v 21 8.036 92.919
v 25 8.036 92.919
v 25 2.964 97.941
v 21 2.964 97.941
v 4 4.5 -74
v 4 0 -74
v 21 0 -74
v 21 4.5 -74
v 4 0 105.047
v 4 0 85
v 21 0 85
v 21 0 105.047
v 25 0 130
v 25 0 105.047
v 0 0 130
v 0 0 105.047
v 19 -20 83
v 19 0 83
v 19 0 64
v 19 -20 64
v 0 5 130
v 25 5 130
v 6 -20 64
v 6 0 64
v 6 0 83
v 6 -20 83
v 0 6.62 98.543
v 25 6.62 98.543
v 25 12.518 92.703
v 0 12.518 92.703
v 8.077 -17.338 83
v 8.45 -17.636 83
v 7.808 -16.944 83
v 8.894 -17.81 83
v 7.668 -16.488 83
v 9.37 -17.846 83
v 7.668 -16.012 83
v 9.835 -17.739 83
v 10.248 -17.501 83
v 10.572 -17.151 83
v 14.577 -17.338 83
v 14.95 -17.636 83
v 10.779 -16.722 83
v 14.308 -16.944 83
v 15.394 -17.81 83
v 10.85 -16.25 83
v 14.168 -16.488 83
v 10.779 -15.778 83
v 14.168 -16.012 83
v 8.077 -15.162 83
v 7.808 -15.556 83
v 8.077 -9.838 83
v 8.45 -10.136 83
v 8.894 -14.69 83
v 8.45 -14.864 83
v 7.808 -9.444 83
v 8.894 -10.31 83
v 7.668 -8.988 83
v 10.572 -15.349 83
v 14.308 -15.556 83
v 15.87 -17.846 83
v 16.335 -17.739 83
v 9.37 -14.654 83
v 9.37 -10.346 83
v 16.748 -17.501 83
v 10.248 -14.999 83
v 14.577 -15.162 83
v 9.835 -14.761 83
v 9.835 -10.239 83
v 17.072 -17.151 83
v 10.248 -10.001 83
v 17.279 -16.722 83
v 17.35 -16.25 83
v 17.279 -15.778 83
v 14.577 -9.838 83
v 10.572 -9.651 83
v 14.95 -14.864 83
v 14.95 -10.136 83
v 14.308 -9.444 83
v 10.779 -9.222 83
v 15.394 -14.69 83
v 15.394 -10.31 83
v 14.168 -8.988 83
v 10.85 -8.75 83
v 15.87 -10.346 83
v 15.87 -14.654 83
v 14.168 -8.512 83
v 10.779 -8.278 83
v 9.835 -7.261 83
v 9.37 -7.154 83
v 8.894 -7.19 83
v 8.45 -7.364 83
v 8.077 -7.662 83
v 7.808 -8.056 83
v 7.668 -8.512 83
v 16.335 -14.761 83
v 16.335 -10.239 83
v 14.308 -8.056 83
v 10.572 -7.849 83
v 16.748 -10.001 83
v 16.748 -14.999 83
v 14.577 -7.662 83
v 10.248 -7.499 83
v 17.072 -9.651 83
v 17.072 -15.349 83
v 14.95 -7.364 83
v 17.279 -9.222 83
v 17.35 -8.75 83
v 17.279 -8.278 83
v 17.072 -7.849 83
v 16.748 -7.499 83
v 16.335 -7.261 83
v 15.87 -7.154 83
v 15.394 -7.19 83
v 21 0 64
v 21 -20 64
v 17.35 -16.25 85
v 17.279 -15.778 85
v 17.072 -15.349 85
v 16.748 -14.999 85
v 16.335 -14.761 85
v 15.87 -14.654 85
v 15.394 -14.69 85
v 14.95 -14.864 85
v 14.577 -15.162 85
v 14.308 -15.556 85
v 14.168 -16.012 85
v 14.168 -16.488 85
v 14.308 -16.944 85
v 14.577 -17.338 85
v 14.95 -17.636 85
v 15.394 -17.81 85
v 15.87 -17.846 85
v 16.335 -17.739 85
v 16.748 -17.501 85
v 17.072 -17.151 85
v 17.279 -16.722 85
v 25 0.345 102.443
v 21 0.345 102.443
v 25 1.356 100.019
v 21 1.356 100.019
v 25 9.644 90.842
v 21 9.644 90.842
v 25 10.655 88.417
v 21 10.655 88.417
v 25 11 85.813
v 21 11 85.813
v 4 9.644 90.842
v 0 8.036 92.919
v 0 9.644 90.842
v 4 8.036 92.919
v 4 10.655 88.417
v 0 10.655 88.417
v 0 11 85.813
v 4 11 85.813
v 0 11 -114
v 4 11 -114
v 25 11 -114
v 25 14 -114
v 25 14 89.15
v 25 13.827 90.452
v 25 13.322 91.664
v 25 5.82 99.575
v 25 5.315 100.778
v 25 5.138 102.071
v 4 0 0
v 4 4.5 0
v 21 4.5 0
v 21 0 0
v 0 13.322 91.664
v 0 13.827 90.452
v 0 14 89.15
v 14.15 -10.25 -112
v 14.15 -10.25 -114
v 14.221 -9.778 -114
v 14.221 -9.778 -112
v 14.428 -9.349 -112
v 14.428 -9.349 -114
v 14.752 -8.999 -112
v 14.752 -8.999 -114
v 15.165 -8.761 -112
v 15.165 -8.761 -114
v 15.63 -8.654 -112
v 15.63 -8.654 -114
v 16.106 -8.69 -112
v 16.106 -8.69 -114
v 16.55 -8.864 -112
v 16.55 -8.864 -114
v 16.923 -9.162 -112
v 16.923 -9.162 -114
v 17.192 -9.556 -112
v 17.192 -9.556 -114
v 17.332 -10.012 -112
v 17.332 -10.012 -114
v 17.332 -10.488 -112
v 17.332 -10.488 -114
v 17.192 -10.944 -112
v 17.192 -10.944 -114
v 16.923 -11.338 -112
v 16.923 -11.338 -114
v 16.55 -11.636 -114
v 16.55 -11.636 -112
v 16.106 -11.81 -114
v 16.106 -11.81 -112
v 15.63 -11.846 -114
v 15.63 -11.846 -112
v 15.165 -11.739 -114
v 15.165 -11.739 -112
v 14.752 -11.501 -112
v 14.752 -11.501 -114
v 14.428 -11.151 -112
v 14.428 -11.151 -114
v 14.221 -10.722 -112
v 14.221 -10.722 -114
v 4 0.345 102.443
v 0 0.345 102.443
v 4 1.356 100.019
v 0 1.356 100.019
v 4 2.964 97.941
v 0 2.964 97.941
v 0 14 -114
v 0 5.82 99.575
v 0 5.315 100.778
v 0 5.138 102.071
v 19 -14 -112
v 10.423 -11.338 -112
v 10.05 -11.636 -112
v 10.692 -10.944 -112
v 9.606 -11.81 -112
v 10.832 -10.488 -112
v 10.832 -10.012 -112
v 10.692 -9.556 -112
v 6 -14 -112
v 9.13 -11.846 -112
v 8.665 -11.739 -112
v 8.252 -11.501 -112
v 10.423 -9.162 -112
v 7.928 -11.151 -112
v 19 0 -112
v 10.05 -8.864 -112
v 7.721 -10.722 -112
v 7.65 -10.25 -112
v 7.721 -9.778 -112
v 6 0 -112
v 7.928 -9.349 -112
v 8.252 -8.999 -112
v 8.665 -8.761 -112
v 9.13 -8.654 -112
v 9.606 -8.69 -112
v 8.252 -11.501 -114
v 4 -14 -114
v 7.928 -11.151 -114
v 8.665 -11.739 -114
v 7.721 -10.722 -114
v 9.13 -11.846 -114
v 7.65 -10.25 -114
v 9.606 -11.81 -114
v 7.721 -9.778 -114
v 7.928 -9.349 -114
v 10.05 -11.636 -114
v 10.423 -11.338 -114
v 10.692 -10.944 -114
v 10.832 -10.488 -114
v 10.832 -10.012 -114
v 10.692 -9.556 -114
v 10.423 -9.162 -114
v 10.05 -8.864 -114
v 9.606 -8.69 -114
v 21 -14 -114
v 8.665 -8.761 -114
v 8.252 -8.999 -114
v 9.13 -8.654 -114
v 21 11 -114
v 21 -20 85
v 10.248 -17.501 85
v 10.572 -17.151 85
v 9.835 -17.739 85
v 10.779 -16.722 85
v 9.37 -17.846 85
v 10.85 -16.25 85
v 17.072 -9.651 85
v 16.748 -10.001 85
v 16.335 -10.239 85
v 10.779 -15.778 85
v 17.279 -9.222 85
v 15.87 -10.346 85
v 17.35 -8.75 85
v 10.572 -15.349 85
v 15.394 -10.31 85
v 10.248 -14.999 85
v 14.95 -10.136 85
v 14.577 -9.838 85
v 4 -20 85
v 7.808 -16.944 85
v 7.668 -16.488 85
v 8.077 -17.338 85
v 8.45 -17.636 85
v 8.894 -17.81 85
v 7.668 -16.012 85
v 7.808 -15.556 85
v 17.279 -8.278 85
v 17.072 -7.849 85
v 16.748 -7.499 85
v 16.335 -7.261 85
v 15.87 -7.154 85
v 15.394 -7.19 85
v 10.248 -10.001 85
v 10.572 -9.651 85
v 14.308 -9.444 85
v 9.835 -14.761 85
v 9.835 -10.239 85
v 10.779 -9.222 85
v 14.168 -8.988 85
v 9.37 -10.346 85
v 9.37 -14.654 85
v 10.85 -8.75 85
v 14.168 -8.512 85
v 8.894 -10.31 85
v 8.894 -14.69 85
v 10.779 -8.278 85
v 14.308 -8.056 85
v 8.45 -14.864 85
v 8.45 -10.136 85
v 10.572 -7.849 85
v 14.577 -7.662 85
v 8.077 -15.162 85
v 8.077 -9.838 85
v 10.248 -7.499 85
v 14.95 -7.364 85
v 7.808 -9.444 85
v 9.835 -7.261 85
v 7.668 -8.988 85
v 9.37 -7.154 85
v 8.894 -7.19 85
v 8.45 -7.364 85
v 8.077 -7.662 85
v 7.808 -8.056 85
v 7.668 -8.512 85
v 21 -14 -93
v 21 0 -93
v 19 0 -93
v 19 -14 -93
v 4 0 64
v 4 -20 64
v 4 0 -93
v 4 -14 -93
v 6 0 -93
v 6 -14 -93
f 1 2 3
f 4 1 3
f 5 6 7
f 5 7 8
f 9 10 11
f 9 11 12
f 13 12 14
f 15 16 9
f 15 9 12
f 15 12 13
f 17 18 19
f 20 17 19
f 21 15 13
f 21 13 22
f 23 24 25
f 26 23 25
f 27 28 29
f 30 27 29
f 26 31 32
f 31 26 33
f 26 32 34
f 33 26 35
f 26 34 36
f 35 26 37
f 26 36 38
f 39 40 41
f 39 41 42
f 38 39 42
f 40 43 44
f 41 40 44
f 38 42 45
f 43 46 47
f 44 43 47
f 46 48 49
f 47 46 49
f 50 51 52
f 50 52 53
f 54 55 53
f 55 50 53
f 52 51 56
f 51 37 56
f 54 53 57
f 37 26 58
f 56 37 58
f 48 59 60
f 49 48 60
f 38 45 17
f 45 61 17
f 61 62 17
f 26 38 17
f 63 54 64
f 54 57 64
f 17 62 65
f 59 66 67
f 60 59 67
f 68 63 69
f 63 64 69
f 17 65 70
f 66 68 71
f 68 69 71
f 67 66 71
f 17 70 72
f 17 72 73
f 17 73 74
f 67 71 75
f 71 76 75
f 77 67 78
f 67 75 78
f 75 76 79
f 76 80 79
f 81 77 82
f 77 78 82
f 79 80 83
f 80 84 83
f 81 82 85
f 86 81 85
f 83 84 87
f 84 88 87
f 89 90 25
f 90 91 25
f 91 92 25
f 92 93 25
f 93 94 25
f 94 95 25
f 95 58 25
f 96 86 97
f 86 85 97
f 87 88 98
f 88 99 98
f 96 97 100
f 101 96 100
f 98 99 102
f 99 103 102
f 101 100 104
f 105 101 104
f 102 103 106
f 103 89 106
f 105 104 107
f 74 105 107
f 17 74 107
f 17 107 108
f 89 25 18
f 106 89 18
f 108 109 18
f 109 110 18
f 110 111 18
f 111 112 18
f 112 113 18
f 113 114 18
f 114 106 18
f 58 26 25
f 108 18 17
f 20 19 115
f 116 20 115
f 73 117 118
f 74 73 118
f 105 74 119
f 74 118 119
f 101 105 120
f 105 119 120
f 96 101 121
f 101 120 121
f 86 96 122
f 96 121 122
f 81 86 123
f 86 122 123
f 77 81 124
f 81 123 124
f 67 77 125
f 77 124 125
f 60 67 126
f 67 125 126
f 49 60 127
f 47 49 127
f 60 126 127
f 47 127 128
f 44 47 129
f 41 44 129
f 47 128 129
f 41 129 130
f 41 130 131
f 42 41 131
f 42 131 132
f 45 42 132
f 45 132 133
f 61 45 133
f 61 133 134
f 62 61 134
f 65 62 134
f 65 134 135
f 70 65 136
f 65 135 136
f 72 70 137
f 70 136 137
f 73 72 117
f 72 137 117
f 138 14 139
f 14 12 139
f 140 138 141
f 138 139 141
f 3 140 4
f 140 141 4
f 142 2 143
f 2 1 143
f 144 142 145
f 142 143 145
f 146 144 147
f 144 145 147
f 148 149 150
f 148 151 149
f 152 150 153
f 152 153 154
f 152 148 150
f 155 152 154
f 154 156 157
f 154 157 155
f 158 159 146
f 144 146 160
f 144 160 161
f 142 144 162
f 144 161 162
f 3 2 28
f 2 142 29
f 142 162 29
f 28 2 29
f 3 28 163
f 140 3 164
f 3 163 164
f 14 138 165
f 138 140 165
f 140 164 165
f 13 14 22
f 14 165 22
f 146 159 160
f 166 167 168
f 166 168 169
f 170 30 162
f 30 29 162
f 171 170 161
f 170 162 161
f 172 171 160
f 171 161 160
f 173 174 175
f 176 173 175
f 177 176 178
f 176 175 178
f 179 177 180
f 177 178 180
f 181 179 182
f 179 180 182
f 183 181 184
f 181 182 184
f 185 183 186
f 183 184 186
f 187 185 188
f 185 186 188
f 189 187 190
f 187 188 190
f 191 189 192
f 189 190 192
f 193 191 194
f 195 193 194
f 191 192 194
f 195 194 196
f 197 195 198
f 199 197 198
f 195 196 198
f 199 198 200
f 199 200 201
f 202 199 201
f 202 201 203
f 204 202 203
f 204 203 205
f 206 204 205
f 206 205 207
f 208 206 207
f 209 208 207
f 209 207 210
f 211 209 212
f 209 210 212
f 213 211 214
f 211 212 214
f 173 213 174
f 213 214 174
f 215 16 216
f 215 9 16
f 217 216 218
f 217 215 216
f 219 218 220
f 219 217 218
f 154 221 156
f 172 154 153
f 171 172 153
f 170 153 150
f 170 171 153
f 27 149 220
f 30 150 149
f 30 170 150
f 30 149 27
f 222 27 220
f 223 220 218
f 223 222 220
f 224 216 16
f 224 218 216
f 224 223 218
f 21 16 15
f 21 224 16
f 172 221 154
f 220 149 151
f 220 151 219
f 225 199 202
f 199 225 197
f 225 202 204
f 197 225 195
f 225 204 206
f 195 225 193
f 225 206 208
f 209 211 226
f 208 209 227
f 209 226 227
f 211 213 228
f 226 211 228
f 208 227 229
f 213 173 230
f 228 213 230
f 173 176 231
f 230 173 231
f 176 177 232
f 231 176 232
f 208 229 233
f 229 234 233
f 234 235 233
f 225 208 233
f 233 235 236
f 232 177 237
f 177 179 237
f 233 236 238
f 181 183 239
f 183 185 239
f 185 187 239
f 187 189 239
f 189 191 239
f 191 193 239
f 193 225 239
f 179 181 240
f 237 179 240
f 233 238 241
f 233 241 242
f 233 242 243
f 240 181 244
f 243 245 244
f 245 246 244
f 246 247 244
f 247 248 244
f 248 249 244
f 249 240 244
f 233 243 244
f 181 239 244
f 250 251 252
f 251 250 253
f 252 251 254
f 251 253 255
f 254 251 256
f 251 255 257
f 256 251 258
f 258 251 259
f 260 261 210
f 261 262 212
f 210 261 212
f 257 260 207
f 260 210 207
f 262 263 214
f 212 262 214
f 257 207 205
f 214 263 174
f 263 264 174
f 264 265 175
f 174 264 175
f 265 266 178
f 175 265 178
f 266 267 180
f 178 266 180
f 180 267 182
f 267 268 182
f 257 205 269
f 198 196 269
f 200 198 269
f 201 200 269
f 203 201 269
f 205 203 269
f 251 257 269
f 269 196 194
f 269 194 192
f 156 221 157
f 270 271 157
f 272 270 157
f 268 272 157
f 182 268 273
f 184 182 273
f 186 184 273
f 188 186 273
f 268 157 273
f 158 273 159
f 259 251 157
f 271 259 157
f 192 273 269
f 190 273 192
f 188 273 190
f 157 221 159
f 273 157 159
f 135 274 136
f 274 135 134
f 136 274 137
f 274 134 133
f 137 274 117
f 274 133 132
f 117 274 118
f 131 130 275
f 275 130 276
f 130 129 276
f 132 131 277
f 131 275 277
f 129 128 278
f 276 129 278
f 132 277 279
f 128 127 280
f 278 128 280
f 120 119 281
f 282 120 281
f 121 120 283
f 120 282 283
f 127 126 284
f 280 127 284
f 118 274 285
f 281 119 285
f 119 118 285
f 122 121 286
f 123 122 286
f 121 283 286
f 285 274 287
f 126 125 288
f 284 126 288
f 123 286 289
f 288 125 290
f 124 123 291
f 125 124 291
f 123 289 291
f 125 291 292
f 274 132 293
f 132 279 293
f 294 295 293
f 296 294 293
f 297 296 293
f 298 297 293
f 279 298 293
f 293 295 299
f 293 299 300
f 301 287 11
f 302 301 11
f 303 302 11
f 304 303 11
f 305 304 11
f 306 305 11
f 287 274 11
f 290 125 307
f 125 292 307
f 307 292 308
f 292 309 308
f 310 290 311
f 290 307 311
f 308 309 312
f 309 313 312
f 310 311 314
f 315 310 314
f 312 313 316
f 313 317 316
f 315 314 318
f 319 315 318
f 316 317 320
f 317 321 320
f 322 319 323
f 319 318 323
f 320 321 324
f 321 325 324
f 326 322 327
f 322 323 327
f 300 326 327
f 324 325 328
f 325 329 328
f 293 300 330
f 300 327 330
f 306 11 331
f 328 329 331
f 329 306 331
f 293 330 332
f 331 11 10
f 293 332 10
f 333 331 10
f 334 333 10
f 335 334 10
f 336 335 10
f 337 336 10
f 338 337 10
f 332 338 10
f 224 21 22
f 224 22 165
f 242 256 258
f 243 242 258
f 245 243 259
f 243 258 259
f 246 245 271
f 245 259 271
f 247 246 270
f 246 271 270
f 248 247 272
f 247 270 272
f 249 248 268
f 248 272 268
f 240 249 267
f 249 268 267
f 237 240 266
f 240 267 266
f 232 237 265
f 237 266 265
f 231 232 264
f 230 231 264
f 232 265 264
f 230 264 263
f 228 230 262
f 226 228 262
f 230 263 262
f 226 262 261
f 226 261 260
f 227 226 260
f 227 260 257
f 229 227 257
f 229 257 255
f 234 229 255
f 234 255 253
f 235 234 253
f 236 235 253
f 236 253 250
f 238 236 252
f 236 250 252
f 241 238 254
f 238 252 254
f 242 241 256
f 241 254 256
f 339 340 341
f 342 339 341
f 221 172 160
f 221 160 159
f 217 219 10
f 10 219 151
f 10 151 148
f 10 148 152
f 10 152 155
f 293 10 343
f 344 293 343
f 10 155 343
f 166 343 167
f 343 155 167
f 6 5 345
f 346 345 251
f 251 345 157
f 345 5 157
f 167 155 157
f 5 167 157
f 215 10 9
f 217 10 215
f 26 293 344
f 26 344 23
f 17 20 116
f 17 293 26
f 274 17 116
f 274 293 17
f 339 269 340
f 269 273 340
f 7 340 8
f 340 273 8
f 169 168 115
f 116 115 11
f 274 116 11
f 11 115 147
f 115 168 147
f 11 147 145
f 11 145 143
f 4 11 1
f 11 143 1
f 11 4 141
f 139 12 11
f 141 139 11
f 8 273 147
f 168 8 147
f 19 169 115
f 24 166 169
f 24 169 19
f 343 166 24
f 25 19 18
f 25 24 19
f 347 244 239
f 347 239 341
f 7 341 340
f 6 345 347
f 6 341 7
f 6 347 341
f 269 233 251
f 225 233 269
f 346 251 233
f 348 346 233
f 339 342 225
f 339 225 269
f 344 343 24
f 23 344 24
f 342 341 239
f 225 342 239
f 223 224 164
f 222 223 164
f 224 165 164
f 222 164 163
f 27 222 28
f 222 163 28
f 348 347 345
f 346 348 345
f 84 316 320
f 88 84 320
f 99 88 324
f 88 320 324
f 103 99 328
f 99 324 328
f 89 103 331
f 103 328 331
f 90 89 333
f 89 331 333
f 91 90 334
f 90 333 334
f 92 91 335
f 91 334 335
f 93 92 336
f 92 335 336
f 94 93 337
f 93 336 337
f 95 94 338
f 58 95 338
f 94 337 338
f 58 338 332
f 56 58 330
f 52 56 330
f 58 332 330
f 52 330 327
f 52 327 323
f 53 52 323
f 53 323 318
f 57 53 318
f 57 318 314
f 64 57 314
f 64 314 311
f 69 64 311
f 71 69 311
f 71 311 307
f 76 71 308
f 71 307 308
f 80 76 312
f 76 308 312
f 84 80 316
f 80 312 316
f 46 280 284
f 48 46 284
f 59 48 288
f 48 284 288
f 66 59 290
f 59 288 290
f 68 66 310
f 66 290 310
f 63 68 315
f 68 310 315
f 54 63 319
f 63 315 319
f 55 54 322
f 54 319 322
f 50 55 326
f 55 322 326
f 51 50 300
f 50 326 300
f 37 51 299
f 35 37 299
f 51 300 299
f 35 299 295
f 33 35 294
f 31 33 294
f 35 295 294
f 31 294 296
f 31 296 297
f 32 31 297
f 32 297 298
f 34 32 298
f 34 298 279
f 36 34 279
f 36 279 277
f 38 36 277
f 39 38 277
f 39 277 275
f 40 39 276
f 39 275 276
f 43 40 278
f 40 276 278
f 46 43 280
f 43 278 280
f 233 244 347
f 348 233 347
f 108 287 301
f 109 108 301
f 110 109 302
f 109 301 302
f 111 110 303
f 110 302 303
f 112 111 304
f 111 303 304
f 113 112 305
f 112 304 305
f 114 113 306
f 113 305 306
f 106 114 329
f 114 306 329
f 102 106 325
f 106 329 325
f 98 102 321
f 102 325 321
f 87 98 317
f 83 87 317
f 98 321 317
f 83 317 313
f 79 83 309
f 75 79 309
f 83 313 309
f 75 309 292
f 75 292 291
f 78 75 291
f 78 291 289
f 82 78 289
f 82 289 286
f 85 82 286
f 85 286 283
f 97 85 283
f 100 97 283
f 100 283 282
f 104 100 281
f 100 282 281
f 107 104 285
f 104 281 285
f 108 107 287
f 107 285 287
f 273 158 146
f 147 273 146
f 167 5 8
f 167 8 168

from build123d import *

# Parameters (mm, degrees)
BOSS_EXTRUDE1_DEPTH = 25
CUT_EXTRUDE2_DEPTH  = 4
FILLET6_R           = 10
FILLET7_R           = 5
BOSS_EXTRUDE2_DEPTH = 20
SKETCH8_R           = 1.6
CUT_EXTRUDE3_DEPTH  = 2
BOSS_EXTRUDE3_DEPTH = 14
SKETCH11_R          = 1.6
CUT_EXTRUDE4_DEPTH  = 2


with BuildPart() as part:
    # Sketch1 → Boss-Extrude1 (new body)
    with BuildSketch(Plane(origin=(0, 0, 0), x_dir=(0, 0, -1), z_dir=(1, 0, 0))):
        Polygon((0, 0), (-130, 0), (-130, 5), (-100.000366453, 5.148280317), (-91.235719846, 14), (114, 14), (114, 0), (74, 0), (74, 4.5), (0, 4.5), align=None)
    extrude(amount=BOSS_EXTRUDE1_DEPTH)

    # Sketch6 → Cut-Extrude2 (cut)
    with BuildSketch(Plane(origin=(25, 0, 0), x_dir=(0, 0, -1), z_dir=(1, 0, 0))):
        Polygon((-100.876178749, 0), (114, 0), (114, 11), (-89.984384146, 11), align=None)
    cut_extrude2 = extrude(amount=-CUT_EXTRUDE2_DEPTH, mode=Mode.SUBTRACT)

    # Mirror3: Cut-Extrude2 across plane
    add(cut_extrude2.mirror(Plane(origin=(12.5, 0, 0), x_dir=(0, 0, 1), z_dir=(1, 0, 0))), mode=Mode.SUBTRACT)

    # Fillet6
    fillet6_edges = [part.edges().sort_by_distance(p)[0] for p in [
        (23, 0, 100.876178749),
        (23, 11, 89.984384146),
        (2, 0, 100.876178749),
        (2, 11, 89.984384146),
    ]]
    fillet(fillet6_edges, radius=FILLET6_R)

    # Fillet7
    fillet7_edges = [part.edges().sort_by_distance(p)[0] for p in [
        (12.5, 5.148280317, 100.000366453),
        (12.5, 14, 91.235719846),
    ]]
    fillet(fillet7_edges, radius=FILLET7_R)

    # Sketch7 → Boss-Extrude2 (add)
    with BuildSketch(Plane.XZ):
        Polygon((21, 85), (4, 85), (4, 64), (6, 64), (6, 83), (19, 83), (19, 64), (21, 64), align=None)
    extrude(amount=BOSS_EXTRUDE2_DEPTH)

    # Sketch8 → Cut-Extrude3 (cut)
    with BuildSketch(Plane.XY.offset(85)):
        with Locations((15.75, -16.25)):
            Circle(SKETCH8_R)
        with Locations((9.25, -16.25)):
            Circle(SKETCH8_R)
        with Locations((9.25, -8.75)):
            Circle(SKETCH8_R)
        with Locations((15.75, -8.75)):
            Circle(SKETCH8_R)
    extrude(amount=-CUT_EXTRUDE3_DEPTH, mode=Mode.SUBTRACT)

    # Sketch9 → Boss-Extrude3 (add)
    with BuildSketch(Plane.XZ):
        Polygon((4, -114), (21, -114), (21, -93), (19, -93), (19, -112), (6, -112), (6, -93), (4, -93), align=None)
    extrude(amount=BOSS_EXTRUDE3_DEPTH)

    # Sketch11 → Cut-Extrude4 (cut)
    with BuildSketch(Plane(origin=(0, 0, -114), x_dir=(-1, 0, 0), z_dir=(0, 0, -1))):
        with Locations((-9.25, -10.25)):
            Circle(SKETCH11_R)
        with Locations((-15.75, -10.25)):
            Circle(SKETCH11_R)
    extrude(amount=-CUT_EXTRUDE4_DEPTH, mode=Mode.SUBTRACT)


solid = part.part
